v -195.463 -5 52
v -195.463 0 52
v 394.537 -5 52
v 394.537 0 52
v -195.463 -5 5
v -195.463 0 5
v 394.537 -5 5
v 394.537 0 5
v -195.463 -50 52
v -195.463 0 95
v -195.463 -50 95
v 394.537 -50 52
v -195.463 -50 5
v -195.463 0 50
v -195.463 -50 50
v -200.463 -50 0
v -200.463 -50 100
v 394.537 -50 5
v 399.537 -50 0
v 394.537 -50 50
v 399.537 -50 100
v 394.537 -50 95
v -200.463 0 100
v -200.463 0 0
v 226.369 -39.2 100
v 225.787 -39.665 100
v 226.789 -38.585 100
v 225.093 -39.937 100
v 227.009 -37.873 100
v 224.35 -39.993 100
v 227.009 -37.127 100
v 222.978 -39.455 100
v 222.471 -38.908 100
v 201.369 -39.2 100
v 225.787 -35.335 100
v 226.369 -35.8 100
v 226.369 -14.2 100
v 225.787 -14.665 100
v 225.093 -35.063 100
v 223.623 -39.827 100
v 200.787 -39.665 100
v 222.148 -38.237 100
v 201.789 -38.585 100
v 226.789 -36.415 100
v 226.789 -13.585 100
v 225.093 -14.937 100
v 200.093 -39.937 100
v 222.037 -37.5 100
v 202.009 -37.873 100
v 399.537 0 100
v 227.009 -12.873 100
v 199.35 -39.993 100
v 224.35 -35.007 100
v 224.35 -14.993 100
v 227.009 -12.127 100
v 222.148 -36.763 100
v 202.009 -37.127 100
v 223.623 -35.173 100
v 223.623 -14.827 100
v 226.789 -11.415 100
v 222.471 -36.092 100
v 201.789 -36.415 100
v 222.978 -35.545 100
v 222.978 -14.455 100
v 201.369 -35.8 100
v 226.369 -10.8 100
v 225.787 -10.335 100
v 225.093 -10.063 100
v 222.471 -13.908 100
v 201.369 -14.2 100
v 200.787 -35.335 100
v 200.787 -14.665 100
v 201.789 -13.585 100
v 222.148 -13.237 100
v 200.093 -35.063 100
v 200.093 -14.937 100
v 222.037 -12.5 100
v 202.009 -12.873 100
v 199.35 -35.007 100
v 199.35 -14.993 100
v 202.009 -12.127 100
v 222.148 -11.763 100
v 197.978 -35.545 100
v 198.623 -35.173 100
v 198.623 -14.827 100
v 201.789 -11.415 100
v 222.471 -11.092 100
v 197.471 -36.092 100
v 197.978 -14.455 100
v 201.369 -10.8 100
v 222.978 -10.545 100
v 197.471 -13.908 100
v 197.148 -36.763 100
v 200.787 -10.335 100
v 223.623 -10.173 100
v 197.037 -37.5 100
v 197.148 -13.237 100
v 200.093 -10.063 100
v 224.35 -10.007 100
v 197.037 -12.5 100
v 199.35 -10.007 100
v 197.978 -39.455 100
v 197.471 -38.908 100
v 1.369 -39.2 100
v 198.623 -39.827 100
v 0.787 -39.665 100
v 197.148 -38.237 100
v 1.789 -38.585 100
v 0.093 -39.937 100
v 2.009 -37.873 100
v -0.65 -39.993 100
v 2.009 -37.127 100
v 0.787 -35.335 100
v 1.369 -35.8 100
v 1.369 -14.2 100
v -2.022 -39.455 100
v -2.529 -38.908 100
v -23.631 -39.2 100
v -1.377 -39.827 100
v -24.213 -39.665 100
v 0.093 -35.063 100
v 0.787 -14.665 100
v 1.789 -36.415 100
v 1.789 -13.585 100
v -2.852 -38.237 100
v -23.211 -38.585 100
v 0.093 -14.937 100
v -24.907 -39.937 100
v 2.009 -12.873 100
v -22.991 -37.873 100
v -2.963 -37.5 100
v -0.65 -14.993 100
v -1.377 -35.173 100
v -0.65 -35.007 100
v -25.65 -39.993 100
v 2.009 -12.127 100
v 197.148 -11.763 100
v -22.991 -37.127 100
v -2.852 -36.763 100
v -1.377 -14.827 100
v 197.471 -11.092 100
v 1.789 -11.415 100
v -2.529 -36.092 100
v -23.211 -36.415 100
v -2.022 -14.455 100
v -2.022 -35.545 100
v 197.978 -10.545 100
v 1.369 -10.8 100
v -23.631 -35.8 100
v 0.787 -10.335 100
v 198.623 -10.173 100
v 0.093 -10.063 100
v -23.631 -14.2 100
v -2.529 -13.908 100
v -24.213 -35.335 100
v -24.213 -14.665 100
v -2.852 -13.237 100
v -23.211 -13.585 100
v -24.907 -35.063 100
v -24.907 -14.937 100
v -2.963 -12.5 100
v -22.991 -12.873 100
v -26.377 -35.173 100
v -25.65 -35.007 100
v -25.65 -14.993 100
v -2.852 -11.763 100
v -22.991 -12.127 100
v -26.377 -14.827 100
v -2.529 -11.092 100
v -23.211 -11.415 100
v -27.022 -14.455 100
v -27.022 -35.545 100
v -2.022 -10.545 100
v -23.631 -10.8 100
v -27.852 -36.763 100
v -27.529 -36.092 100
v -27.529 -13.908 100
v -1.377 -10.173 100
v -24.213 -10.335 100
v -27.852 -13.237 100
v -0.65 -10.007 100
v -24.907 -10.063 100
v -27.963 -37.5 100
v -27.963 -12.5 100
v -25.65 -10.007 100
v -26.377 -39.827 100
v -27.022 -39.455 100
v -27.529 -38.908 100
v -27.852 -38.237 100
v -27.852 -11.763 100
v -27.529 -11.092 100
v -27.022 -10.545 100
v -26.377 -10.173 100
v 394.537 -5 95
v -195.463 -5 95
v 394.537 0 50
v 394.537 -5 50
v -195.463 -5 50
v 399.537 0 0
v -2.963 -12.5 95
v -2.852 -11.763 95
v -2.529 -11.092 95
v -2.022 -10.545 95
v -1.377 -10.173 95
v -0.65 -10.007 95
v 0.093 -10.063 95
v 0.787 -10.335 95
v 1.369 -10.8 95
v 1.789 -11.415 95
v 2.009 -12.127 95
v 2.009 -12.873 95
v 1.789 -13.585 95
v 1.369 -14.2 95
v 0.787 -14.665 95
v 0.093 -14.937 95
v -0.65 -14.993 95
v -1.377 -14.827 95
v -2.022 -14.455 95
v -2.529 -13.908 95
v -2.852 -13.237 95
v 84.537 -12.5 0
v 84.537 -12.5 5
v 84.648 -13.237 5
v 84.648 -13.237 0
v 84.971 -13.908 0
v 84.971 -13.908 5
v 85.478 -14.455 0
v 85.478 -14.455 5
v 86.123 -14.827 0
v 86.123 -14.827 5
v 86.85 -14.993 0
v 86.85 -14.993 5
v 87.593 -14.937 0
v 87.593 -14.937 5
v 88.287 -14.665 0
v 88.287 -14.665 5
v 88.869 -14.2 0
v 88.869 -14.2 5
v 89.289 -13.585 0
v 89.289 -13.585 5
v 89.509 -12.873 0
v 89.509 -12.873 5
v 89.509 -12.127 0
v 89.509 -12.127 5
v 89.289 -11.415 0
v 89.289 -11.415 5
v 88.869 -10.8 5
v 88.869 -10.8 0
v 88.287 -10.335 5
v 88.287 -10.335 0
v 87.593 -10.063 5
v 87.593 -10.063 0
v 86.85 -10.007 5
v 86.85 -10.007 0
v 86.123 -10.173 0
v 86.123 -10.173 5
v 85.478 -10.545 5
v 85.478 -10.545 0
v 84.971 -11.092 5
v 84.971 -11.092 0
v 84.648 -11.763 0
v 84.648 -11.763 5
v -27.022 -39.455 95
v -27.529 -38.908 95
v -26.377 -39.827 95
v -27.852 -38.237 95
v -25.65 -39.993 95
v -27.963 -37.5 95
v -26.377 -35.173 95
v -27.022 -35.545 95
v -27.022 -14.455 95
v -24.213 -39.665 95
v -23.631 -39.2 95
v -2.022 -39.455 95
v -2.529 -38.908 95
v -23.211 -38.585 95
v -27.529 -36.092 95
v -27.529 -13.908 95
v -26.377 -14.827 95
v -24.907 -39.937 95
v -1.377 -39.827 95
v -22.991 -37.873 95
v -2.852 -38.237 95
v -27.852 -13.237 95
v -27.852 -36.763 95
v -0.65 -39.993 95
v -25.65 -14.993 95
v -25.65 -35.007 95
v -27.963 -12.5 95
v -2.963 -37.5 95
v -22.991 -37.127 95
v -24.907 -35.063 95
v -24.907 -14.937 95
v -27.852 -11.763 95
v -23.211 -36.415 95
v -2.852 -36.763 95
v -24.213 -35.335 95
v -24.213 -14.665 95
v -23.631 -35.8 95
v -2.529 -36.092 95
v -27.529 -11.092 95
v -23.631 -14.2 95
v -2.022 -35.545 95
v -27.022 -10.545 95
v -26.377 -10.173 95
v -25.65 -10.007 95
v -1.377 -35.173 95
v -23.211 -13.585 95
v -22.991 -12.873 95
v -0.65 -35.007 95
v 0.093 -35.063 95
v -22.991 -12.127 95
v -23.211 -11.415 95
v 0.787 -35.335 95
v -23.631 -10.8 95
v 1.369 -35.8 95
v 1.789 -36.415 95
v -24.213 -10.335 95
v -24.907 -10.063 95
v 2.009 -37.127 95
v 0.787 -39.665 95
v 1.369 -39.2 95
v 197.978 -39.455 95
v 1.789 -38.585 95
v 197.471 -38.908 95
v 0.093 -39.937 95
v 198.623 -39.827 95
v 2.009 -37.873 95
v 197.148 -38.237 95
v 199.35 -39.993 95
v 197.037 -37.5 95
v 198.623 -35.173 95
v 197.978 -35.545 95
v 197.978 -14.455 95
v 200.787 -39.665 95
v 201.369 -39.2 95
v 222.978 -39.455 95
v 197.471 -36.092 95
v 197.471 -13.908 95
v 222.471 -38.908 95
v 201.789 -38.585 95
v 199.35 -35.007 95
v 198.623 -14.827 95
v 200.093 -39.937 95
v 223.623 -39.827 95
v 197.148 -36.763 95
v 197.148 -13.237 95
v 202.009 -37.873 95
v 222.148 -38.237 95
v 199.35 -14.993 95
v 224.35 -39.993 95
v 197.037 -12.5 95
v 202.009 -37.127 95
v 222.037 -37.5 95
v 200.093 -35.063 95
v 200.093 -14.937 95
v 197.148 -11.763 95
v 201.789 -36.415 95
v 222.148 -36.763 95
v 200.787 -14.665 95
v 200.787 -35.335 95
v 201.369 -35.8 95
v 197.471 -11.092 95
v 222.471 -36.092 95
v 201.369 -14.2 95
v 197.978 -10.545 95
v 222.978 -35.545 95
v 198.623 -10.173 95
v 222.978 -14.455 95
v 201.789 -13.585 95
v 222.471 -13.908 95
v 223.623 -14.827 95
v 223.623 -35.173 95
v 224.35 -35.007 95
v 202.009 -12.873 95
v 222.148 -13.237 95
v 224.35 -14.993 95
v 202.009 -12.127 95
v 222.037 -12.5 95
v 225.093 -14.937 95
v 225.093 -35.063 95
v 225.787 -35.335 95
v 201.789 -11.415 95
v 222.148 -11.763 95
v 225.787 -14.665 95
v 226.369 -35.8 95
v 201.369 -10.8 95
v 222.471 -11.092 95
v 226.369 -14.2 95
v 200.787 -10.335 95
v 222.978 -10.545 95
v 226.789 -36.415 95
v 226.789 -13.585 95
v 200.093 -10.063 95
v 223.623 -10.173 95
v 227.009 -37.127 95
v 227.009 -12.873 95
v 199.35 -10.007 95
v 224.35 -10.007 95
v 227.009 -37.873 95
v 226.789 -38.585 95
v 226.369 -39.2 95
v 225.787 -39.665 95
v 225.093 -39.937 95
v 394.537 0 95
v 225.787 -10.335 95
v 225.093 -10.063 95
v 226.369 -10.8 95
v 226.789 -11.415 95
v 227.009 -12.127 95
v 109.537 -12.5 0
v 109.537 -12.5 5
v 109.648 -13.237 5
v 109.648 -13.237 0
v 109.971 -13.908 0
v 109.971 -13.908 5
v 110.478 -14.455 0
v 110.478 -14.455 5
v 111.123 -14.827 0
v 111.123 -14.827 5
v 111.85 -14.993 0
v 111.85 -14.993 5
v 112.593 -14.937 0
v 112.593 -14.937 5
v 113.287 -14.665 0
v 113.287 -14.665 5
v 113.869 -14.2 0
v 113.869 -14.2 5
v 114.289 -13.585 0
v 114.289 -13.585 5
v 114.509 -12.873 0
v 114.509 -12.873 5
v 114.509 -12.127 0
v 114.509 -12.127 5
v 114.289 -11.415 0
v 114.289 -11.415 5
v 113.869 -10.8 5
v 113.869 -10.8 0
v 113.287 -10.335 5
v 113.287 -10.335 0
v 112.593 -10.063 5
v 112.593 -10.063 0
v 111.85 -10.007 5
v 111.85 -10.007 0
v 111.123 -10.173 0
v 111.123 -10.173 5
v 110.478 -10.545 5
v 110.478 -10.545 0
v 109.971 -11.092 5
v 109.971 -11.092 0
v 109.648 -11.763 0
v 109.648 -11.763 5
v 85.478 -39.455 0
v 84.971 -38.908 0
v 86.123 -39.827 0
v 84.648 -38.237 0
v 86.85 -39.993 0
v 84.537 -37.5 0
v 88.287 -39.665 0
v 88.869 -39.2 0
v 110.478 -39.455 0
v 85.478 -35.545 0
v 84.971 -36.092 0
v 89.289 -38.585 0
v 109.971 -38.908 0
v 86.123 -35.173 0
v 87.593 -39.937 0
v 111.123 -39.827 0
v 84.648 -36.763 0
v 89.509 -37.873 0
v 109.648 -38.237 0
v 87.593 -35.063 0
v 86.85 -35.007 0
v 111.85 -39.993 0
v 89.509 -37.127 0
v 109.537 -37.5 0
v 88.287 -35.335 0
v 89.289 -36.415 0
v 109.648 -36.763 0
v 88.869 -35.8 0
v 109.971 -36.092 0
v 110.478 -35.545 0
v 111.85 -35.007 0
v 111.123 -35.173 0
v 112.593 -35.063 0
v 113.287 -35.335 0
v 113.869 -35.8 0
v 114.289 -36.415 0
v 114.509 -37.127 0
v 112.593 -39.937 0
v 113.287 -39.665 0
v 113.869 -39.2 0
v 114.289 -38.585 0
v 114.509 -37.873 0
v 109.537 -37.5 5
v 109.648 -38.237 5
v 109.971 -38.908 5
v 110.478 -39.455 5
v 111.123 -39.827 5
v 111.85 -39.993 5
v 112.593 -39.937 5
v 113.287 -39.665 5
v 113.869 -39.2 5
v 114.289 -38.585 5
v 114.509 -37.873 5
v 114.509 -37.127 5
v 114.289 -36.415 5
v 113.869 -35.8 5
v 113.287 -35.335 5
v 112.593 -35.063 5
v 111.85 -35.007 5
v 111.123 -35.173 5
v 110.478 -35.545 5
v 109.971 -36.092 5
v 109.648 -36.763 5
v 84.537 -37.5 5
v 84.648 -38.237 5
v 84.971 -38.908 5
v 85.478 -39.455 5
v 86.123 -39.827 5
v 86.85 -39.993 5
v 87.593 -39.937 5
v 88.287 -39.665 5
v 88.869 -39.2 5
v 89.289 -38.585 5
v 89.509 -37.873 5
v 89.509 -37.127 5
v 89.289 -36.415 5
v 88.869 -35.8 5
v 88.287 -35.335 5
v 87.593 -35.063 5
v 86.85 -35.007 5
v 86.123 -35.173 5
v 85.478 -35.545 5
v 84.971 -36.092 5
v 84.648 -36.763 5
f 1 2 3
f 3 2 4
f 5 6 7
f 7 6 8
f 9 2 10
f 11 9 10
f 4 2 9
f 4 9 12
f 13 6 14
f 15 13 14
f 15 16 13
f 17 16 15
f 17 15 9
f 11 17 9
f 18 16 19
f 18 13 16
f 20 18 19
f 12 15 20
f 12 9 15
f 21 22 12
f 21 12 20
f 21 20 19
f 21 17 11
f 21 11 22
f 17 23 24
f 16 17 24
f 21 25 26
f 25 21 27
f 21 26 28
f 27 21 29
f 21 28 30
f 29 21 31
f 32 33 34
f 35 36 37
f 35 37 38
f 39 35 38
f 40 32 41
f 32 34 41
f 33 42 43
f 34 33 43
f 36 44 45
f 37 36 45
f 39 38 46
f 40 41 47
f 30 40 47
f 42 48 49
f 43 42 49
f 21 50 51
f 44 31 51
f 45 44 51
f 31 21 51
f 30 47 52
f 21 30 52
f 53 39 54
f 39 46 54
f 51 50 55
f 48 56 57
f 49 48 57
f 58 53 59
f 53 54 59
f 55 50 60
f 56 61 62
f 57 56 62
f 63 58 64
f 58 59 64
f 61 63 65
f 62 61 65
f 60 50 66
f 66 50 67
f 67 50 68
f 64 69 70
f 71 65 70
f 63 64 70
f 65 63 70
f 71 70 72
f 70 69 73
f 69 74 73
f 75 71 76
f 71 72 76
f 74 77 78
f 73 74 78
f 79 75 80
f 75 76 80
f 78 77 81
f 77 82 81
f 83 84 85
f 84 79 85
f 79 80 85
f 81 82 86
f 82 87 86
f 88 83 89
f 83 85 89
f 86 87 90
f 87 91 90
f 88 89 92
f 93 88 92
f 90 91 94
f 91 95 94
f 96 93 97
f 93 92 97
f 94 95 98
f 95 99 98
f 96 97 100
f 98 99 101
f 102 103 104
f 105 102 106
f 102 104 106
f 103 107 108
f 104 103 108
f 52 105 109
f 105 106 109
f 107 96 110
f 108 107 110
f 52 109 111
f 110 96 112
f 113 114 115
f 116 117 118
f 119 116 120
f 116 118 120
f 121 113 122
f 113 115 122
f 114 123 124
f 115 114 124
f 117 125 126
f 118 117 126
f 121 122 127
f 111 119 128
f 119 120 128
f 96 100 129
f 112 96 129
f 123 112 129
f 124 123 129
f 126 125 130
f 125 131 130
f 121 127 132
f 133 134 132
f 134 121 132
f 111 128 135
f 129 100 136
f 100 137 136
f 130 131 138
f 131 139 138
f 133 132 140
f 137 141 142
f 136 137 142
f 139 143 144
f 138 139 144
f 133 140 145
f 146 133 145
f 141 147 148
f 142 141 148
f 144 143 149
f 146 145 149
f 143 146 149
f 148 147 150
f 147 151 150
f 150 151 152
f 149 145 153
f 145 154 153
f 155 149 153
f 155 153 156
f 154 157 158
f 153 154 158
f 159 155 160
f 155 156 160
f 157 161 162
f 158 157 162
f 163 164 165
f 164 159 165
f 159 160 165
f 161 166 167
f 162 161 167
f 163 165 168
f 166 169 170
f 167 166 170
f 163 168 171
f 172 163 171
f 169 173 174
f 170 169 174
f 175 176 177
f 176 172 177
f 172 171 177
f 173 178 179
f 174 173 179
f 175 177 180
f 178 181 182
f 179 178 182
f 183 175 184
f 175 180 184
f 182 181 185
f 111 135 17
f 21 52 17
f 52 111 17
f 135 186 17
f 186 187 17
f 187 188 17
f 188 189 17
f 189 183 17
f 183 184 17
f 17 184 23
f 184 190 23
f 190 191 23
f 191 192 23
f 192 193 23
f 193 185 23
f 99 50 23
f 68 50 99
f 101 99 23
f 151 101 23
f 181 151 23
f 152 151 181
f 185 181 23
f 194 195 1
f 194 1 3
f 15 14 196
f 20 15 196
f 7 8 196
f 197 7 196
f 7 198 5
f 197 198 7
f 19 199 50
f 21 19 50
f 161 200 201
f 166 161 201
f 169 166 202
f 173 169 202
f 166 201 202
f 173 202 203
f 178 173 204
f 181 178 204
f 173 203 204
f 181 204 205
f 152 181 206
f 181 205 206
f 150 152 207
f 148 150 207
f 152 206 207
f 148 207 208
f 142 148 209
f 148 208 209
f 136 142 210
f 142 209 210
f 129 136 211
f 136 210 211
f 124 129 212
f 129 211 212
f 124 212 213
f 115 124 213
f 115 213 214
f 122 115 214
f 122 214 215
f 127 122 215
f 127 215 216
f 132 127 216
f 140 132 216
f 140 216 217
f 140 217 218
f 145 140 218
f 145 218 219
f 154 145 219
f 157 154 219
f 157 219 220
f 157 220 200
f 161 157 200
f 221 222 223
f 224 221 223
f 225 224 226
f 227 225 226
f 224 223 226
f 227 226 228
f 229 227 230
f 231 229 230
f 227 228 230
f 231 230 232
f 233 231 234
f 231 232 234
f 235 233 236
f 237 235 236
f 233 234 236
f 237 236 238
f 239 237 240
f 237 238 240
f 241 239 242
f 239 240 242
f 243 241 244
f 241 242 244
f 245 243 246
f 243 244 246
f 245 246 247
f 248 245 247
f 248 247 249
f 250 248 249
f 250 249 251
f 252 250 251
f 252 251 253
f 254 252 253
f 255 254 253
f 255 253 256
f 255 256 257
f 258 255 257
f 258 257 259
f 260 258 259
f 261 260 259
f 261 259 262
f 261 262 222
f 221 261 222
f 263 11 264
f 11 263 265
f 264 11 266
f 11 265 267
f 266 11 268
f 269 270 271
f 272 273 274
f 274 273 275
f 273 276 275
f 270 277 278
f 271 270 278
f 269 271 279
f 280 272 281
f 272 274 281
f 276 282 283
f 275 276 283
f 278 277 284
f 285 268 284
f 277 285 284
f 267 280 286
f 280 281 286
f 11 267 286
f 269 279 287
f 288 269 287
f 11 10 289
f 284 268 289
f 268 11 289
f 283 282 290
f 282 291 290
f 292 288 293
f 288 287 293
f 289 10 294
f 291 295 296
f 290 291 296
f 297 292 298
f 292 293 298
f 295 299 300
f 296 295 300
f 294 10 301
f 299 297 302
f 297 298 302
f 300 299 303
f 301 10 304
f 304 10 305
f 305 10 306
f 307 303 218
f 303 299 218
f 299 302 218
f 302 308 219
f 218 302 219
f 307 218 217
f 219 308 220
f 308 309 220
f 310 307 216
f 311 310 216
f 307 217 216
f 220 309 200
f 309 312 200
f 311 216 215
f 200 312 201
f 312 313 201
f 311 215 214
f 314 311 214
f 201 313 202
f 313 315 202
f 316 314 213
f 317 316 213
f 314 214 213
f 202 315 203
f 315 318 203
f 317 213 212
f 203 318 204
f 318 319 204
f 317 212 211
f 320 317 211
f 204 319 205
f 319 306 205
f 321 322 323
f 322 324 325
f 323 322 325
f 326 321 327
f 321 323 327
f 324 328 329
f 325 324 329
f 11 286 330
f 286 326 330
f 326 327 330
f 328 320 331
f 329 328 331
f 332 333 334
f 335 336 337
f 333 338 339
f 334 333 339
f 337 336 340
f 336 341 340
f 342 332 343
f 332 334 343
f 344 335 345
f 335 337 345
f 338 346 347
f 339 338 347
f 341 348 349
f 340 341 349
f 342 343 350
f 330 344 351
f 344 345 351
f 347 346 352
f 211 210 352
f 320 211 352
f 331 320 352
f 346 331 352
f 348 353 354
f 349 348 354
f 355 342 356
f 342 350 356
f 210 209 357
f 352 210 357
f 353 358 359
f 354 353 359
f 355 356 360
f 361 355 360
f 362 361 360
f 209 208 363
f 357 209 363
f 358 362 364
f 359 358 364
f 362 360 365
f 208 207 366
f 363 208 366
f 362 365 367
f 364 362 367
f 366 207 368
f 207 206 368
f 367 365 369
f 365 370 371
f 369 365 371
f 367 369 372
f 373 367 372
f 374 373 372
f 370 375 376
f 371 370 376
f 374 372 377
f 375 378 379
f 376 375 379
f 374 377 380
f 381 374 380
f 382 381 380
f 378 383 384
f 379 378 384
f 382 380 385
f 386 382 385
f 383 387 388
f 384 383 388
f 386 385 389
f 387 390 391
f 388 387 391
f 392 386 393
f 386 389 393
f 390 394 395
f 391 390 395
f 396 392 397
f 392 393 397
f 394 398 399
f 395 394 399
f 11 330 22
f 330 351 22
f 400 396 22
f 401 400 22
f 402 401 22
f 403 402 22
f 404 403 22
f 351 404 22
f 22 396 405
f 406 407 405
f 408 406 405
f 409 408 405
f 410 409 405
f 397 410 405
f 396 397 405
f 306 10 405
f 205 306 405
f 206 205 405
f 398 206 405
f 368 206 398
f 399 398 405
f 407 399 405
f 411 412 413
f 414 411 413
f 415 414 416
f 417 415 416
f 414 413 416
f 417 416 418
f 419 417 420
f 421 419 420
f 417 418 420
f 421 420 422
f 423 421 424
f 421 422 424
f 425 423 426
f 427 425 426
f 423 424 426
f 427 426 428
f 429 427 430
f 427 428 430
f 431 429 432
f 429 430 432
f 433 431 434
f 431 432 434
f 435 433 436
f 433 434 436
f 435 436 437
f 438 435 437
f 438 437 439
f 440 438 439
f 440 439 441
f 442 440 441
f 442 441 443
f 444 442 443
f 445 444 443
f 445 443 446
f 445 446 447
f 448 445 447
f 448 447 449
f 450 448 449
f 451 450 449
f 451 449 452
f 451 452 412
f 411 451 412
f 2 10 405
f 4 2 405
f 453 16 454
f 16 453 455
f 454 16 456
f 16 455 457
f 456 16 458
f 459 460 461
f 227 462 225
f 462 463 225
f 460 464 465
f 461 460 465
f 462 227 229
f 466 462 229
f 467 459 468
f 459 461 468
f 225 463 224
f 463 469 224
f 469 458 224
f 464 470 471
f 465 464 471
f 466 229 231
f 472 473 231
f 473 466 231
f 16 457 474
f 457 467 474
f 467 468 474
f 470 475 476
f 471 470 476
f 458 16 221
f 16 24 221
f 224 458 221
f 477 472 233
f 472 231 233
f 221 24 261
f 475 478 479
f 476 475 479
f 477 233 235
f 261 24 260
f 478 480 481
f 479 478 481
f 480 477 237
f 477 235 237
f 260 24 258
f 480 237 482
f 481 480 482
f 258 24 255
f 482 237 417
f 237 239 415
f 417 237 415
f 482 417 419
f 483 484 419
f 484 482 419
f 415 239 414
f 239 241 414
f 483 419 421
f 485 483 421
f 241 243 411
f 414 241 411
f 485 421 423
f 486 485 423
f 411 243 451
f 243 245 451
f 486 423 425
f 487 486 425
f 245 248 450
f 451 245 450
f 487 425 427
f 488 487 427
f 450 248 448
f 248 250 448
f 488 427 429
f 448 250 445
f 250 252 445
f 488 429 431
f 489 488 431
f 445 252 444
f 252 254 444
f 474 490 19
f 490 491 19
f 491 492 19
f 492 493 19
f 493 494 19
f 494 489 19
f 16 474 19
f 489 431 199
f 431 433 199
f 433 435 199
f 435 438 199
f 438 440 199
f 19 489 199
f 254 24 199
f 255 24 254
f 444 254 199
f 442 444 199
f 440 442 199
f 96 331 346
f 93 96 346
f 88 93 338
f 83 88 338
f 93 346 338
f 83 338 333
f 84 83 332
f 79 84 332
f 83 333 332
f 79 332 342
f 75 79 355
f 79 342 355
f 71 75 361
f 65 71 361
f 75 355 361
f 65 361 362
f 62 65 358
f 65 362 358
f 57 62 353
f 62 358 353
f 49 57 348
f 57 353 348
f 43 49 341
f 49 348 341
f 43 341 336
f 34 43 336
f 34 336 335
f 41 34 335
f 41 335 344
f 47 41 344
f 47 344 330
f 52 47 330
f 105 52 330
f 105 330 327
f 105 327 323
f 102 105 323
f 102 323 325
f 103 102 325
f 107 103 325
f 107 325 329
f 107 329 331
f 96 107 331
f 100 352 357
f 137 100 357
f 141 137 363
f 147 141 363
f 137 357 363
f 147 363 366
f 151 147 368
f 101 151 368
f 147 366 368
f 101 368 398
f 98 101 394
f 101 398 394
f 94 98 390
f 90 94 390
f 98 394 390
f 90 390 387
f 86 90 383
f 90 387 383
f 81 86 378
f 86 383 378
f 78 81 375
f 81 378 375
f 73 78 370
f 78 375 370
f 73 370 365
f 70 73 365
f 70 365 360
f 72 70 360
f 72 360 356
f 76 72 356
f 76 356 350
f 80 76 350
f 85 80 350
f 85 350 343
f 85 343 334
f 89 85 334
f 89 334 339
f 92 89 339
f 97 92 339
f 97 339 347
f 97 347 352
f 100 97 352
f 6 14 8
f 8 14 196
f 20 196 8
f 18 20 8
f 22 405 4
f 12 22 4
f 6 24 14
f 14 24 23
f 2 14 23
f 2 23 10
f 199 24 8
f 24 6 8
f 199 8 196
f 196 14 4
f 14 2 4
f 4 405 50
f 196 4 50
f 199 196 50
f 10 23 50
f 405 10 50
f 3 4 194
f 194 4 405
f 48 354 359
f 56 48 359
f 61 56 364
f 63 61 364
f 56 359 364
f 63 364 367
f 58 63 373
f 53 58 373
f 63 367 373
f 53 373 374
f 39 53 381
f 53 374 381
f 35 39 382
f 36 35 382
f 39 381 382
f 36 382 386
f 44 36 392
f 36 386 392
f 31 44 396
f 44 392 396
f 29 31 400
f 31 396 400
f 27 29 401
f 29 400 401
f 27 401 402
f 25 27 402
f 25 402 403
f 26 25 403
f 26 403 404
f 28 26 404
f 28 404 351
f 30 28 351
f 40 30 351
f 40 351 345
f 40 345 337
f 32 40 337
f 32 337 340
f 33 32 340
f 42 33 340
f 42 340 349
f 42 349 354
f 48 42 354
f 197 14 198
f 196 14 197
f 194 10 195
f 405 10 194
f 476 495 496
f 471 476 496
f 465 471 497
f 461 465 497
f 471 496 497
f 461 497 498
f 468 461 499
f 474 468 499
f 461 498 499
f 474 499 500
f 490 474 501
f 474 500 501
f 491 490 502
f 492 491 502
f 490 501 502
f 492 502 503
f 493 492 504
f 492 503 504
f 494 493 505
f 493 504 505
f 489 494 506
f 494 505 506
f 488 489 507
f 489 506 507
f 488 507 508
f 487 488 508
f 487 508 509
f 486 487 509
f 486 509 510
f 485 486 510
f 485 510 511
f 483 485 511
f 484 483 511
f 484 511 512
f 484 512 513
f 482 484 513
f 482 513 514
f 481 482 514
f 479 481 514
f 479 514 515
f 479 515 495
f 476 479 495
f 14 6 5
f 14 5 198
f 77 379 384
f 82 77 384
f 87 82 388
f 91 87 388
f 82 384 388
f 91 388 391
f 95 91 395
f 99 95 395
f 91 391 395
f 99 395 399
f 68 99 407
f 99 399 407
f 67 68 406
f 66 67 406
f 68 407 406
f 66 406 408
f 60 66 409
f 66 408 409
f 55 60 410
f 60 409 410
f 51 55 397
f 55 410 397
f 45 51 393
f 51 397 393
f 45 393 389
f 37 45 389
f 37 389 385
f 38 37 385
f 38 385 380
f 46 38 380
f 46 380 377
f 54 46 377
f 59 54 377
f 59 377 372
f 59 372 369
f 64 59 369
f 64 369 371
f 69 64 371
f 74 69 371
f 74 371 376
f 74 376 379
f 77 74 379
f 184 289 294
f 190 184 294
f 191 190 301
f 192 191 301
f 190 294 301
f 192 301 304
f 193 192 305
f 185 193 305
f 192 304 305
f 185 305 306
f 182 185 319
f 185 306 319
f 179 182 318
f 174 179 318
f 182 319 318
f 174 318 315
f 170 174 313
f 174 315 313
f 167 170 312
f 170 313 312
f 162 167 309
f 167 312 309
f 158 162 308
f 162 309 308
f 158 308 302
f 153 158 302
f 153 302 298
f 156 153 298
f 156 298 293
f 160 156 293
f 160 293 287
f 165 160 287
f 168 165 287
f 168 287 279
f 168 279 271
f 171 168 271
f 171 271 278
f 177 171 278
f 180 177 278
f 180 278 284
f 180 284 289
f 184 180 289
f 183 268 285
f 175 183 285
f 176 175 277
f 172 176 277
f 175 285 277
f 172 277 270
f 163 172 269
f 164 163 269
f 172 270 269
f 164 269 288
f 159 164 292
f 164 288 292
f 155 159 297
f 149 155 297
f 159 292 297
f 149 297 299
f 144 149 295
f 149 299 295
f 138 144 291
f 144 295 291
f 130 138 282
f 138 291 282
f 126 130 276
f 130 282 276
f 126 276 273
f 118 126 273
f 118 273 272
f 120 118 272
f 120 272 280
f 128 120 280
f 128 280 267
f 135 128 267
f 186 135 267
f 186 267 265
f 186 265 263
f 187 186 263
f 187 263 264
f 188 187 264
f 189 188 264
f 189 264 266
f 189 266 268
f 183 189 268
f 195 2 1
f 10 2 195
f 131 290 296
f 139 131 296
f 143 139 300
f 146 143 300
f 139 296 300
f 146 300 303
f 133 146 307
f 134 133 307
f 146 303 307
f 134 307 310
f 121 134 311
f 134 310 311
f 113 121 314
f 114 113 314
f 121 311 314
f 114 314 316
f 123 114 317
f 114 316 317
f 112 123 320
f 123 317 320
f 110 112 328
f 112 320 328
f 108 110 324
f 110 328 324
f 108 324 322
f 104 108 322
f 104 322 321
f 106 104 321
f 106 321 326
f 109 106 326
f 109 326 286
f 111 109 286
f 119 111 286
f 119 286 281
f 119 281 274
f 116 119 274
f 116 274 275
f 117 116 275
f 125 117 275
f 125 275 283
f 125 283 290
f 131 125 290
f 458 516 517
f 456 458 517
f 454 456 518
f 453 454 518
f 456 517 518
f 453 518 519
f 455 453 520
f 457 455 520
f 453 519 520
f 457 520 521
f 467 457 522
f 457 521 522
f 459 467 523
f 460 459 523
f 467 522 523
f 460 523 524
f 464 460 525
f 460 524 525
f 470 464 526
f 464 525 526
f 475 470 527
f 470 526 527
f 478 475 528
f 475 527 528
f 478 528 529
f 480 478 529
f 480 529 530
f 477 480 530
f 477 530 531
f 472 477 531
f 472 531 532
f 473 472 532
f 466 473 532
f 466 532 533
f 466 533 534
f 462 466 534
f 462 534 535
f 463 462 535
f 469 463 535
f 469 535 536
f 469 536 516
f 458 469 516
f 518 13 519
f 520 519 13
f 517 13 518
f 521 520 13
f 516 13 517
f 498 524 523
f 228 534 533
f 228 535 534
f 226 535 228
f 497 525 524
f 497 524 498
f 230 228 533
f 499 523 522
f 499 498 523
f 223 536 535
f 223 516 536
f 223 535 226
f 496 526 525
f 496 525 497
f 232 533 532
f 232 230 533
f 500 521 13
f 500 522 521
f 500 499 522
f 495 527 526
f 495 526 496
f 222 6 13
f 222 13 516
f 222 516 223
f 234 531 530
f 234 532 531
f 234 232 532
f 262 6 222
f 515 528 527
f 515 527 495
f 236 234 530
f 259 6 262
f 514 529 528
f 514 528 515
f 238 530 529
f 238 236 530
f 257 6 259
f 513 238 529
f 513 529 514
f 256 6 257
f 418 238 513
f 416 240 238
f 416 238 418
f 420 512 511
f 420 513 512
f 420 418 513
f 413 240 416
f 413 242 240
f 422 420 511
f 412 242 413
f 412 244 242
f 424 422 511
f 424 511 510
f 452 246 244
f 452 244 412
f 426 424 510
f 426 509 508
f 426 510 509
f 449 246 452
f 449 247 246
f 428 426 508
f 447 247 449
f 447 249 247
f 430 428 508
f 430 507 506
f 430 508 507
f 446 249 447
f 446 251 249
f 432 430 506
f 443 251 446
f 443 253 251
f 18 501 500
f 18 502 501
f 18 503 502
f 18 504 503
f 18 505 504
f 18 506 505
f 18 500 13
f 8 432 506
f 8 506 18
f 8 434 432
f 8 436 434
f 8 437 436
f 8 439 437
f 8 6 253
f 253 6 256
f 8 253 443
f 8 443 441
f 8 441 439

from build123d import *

# Parameters (mm, degrees)
F0_W     = 590
F0_H     = 45
F1_DEPTH = 5
F0_H_2   = 43
F0_H_3   = 5
F0_H_4   = 2
F2_DEPTH = 50
F4_D     = 5
F4_DEPTH = 12
F4_TIP   = 1.5021515476
F6_D     = 5
F6_DEPTH = 12
F6_TIP   = 1.5021515476


with BuildPart() as f1:
    # F0 (on Front) → F1 (new body)
    with BuildSketch(Plane.XZ):
        with Locations((99.536625368, 27.5)):
            Rectangle(F0_W, F0_H)
    extrude(amount=F1_DEPTH)


with BuildPart() as f1b:
    # F0 (on Front) → F1, piece 2 (new body)
    with BuildSketch(Plane.XZ):
        with Locations((99.536625368, 73.5)):
            Rectangle(F0_W, F0_H_2)
    extrude(amount=F1_DEPTH)


with BuildPart() as f2:
    # F0 (on Front) → F2 (new body)
    with BuildSketch(Plane.XZ):
        Polygon((-200.463374632, 100), (-200.463374632, 0), (-195.463374632, 0), (-195.463374632, 5), (-195.463374632, 50), (-195.463374632, 52), (-195.463374632, 95), (-195.463374632, 100), align=None)
        with Locations((99.536625368, 2.5)):
            Rectangle(F0_W, F0_H_3)
        with Locations((99.536625368, 51)):
            Rectangle(F0_W, F0_H_4)
        with Locations((99.536625368, 97.5)):
            Rectangle(F0_W, F0_H_3)
        Polygon((394.536625368, 5), (394.536625368, 0), (399.536625368, 0), (399.536625368, 100), (394.536625368, 100), (394.536625368, 95), (394.536625368, 52), (394.536625368, 50), align=None)
    extrude(amount=F2_DEPTH)

    # F4
    with Locations(Plane(origin=(0, 0, 0), x_dir=(1, 0, 0), z_dir=(0, 0, -1))):
        with Locations((87.036625368, 37.5), (112.036625368, 37.5), (112.036625368, 12.5), (87.036625368, 12.5)):
            Hole(F4_D / 2, depth=F4_DEPTH)
            with Locations((0, 0, -(F4_DEPTH + F4_TIP / 2))):  # 118° drill point
                Cone(0, F4_D / 2, F4_TIP, mode=Mode.SUBTRACT)

    # F6
    with Locations(Plane.XY.offset(100)):
        with Locations((199.536625368, -12.5), (224.536625368, -12.5), (224.536625368, -37.5), (199.536625368, -37.5), (-25.463374632, -12.5), (-0.463374632, -12.5), (-0.463374632, -37.5), (-25.463374632, -37.5)):
            Hole(F6_D / 2, depth=F6_DEPTH)
            with Locations((0, 0, -(F6_DEPTH + F6_TIP / 2))):  # 118° drill point
                Cone(0, F6_D / 2, F6_TIP, mode=Mode.SUBTRACT)


solid = Compound([f1.part, f1b.part, f2.part])
